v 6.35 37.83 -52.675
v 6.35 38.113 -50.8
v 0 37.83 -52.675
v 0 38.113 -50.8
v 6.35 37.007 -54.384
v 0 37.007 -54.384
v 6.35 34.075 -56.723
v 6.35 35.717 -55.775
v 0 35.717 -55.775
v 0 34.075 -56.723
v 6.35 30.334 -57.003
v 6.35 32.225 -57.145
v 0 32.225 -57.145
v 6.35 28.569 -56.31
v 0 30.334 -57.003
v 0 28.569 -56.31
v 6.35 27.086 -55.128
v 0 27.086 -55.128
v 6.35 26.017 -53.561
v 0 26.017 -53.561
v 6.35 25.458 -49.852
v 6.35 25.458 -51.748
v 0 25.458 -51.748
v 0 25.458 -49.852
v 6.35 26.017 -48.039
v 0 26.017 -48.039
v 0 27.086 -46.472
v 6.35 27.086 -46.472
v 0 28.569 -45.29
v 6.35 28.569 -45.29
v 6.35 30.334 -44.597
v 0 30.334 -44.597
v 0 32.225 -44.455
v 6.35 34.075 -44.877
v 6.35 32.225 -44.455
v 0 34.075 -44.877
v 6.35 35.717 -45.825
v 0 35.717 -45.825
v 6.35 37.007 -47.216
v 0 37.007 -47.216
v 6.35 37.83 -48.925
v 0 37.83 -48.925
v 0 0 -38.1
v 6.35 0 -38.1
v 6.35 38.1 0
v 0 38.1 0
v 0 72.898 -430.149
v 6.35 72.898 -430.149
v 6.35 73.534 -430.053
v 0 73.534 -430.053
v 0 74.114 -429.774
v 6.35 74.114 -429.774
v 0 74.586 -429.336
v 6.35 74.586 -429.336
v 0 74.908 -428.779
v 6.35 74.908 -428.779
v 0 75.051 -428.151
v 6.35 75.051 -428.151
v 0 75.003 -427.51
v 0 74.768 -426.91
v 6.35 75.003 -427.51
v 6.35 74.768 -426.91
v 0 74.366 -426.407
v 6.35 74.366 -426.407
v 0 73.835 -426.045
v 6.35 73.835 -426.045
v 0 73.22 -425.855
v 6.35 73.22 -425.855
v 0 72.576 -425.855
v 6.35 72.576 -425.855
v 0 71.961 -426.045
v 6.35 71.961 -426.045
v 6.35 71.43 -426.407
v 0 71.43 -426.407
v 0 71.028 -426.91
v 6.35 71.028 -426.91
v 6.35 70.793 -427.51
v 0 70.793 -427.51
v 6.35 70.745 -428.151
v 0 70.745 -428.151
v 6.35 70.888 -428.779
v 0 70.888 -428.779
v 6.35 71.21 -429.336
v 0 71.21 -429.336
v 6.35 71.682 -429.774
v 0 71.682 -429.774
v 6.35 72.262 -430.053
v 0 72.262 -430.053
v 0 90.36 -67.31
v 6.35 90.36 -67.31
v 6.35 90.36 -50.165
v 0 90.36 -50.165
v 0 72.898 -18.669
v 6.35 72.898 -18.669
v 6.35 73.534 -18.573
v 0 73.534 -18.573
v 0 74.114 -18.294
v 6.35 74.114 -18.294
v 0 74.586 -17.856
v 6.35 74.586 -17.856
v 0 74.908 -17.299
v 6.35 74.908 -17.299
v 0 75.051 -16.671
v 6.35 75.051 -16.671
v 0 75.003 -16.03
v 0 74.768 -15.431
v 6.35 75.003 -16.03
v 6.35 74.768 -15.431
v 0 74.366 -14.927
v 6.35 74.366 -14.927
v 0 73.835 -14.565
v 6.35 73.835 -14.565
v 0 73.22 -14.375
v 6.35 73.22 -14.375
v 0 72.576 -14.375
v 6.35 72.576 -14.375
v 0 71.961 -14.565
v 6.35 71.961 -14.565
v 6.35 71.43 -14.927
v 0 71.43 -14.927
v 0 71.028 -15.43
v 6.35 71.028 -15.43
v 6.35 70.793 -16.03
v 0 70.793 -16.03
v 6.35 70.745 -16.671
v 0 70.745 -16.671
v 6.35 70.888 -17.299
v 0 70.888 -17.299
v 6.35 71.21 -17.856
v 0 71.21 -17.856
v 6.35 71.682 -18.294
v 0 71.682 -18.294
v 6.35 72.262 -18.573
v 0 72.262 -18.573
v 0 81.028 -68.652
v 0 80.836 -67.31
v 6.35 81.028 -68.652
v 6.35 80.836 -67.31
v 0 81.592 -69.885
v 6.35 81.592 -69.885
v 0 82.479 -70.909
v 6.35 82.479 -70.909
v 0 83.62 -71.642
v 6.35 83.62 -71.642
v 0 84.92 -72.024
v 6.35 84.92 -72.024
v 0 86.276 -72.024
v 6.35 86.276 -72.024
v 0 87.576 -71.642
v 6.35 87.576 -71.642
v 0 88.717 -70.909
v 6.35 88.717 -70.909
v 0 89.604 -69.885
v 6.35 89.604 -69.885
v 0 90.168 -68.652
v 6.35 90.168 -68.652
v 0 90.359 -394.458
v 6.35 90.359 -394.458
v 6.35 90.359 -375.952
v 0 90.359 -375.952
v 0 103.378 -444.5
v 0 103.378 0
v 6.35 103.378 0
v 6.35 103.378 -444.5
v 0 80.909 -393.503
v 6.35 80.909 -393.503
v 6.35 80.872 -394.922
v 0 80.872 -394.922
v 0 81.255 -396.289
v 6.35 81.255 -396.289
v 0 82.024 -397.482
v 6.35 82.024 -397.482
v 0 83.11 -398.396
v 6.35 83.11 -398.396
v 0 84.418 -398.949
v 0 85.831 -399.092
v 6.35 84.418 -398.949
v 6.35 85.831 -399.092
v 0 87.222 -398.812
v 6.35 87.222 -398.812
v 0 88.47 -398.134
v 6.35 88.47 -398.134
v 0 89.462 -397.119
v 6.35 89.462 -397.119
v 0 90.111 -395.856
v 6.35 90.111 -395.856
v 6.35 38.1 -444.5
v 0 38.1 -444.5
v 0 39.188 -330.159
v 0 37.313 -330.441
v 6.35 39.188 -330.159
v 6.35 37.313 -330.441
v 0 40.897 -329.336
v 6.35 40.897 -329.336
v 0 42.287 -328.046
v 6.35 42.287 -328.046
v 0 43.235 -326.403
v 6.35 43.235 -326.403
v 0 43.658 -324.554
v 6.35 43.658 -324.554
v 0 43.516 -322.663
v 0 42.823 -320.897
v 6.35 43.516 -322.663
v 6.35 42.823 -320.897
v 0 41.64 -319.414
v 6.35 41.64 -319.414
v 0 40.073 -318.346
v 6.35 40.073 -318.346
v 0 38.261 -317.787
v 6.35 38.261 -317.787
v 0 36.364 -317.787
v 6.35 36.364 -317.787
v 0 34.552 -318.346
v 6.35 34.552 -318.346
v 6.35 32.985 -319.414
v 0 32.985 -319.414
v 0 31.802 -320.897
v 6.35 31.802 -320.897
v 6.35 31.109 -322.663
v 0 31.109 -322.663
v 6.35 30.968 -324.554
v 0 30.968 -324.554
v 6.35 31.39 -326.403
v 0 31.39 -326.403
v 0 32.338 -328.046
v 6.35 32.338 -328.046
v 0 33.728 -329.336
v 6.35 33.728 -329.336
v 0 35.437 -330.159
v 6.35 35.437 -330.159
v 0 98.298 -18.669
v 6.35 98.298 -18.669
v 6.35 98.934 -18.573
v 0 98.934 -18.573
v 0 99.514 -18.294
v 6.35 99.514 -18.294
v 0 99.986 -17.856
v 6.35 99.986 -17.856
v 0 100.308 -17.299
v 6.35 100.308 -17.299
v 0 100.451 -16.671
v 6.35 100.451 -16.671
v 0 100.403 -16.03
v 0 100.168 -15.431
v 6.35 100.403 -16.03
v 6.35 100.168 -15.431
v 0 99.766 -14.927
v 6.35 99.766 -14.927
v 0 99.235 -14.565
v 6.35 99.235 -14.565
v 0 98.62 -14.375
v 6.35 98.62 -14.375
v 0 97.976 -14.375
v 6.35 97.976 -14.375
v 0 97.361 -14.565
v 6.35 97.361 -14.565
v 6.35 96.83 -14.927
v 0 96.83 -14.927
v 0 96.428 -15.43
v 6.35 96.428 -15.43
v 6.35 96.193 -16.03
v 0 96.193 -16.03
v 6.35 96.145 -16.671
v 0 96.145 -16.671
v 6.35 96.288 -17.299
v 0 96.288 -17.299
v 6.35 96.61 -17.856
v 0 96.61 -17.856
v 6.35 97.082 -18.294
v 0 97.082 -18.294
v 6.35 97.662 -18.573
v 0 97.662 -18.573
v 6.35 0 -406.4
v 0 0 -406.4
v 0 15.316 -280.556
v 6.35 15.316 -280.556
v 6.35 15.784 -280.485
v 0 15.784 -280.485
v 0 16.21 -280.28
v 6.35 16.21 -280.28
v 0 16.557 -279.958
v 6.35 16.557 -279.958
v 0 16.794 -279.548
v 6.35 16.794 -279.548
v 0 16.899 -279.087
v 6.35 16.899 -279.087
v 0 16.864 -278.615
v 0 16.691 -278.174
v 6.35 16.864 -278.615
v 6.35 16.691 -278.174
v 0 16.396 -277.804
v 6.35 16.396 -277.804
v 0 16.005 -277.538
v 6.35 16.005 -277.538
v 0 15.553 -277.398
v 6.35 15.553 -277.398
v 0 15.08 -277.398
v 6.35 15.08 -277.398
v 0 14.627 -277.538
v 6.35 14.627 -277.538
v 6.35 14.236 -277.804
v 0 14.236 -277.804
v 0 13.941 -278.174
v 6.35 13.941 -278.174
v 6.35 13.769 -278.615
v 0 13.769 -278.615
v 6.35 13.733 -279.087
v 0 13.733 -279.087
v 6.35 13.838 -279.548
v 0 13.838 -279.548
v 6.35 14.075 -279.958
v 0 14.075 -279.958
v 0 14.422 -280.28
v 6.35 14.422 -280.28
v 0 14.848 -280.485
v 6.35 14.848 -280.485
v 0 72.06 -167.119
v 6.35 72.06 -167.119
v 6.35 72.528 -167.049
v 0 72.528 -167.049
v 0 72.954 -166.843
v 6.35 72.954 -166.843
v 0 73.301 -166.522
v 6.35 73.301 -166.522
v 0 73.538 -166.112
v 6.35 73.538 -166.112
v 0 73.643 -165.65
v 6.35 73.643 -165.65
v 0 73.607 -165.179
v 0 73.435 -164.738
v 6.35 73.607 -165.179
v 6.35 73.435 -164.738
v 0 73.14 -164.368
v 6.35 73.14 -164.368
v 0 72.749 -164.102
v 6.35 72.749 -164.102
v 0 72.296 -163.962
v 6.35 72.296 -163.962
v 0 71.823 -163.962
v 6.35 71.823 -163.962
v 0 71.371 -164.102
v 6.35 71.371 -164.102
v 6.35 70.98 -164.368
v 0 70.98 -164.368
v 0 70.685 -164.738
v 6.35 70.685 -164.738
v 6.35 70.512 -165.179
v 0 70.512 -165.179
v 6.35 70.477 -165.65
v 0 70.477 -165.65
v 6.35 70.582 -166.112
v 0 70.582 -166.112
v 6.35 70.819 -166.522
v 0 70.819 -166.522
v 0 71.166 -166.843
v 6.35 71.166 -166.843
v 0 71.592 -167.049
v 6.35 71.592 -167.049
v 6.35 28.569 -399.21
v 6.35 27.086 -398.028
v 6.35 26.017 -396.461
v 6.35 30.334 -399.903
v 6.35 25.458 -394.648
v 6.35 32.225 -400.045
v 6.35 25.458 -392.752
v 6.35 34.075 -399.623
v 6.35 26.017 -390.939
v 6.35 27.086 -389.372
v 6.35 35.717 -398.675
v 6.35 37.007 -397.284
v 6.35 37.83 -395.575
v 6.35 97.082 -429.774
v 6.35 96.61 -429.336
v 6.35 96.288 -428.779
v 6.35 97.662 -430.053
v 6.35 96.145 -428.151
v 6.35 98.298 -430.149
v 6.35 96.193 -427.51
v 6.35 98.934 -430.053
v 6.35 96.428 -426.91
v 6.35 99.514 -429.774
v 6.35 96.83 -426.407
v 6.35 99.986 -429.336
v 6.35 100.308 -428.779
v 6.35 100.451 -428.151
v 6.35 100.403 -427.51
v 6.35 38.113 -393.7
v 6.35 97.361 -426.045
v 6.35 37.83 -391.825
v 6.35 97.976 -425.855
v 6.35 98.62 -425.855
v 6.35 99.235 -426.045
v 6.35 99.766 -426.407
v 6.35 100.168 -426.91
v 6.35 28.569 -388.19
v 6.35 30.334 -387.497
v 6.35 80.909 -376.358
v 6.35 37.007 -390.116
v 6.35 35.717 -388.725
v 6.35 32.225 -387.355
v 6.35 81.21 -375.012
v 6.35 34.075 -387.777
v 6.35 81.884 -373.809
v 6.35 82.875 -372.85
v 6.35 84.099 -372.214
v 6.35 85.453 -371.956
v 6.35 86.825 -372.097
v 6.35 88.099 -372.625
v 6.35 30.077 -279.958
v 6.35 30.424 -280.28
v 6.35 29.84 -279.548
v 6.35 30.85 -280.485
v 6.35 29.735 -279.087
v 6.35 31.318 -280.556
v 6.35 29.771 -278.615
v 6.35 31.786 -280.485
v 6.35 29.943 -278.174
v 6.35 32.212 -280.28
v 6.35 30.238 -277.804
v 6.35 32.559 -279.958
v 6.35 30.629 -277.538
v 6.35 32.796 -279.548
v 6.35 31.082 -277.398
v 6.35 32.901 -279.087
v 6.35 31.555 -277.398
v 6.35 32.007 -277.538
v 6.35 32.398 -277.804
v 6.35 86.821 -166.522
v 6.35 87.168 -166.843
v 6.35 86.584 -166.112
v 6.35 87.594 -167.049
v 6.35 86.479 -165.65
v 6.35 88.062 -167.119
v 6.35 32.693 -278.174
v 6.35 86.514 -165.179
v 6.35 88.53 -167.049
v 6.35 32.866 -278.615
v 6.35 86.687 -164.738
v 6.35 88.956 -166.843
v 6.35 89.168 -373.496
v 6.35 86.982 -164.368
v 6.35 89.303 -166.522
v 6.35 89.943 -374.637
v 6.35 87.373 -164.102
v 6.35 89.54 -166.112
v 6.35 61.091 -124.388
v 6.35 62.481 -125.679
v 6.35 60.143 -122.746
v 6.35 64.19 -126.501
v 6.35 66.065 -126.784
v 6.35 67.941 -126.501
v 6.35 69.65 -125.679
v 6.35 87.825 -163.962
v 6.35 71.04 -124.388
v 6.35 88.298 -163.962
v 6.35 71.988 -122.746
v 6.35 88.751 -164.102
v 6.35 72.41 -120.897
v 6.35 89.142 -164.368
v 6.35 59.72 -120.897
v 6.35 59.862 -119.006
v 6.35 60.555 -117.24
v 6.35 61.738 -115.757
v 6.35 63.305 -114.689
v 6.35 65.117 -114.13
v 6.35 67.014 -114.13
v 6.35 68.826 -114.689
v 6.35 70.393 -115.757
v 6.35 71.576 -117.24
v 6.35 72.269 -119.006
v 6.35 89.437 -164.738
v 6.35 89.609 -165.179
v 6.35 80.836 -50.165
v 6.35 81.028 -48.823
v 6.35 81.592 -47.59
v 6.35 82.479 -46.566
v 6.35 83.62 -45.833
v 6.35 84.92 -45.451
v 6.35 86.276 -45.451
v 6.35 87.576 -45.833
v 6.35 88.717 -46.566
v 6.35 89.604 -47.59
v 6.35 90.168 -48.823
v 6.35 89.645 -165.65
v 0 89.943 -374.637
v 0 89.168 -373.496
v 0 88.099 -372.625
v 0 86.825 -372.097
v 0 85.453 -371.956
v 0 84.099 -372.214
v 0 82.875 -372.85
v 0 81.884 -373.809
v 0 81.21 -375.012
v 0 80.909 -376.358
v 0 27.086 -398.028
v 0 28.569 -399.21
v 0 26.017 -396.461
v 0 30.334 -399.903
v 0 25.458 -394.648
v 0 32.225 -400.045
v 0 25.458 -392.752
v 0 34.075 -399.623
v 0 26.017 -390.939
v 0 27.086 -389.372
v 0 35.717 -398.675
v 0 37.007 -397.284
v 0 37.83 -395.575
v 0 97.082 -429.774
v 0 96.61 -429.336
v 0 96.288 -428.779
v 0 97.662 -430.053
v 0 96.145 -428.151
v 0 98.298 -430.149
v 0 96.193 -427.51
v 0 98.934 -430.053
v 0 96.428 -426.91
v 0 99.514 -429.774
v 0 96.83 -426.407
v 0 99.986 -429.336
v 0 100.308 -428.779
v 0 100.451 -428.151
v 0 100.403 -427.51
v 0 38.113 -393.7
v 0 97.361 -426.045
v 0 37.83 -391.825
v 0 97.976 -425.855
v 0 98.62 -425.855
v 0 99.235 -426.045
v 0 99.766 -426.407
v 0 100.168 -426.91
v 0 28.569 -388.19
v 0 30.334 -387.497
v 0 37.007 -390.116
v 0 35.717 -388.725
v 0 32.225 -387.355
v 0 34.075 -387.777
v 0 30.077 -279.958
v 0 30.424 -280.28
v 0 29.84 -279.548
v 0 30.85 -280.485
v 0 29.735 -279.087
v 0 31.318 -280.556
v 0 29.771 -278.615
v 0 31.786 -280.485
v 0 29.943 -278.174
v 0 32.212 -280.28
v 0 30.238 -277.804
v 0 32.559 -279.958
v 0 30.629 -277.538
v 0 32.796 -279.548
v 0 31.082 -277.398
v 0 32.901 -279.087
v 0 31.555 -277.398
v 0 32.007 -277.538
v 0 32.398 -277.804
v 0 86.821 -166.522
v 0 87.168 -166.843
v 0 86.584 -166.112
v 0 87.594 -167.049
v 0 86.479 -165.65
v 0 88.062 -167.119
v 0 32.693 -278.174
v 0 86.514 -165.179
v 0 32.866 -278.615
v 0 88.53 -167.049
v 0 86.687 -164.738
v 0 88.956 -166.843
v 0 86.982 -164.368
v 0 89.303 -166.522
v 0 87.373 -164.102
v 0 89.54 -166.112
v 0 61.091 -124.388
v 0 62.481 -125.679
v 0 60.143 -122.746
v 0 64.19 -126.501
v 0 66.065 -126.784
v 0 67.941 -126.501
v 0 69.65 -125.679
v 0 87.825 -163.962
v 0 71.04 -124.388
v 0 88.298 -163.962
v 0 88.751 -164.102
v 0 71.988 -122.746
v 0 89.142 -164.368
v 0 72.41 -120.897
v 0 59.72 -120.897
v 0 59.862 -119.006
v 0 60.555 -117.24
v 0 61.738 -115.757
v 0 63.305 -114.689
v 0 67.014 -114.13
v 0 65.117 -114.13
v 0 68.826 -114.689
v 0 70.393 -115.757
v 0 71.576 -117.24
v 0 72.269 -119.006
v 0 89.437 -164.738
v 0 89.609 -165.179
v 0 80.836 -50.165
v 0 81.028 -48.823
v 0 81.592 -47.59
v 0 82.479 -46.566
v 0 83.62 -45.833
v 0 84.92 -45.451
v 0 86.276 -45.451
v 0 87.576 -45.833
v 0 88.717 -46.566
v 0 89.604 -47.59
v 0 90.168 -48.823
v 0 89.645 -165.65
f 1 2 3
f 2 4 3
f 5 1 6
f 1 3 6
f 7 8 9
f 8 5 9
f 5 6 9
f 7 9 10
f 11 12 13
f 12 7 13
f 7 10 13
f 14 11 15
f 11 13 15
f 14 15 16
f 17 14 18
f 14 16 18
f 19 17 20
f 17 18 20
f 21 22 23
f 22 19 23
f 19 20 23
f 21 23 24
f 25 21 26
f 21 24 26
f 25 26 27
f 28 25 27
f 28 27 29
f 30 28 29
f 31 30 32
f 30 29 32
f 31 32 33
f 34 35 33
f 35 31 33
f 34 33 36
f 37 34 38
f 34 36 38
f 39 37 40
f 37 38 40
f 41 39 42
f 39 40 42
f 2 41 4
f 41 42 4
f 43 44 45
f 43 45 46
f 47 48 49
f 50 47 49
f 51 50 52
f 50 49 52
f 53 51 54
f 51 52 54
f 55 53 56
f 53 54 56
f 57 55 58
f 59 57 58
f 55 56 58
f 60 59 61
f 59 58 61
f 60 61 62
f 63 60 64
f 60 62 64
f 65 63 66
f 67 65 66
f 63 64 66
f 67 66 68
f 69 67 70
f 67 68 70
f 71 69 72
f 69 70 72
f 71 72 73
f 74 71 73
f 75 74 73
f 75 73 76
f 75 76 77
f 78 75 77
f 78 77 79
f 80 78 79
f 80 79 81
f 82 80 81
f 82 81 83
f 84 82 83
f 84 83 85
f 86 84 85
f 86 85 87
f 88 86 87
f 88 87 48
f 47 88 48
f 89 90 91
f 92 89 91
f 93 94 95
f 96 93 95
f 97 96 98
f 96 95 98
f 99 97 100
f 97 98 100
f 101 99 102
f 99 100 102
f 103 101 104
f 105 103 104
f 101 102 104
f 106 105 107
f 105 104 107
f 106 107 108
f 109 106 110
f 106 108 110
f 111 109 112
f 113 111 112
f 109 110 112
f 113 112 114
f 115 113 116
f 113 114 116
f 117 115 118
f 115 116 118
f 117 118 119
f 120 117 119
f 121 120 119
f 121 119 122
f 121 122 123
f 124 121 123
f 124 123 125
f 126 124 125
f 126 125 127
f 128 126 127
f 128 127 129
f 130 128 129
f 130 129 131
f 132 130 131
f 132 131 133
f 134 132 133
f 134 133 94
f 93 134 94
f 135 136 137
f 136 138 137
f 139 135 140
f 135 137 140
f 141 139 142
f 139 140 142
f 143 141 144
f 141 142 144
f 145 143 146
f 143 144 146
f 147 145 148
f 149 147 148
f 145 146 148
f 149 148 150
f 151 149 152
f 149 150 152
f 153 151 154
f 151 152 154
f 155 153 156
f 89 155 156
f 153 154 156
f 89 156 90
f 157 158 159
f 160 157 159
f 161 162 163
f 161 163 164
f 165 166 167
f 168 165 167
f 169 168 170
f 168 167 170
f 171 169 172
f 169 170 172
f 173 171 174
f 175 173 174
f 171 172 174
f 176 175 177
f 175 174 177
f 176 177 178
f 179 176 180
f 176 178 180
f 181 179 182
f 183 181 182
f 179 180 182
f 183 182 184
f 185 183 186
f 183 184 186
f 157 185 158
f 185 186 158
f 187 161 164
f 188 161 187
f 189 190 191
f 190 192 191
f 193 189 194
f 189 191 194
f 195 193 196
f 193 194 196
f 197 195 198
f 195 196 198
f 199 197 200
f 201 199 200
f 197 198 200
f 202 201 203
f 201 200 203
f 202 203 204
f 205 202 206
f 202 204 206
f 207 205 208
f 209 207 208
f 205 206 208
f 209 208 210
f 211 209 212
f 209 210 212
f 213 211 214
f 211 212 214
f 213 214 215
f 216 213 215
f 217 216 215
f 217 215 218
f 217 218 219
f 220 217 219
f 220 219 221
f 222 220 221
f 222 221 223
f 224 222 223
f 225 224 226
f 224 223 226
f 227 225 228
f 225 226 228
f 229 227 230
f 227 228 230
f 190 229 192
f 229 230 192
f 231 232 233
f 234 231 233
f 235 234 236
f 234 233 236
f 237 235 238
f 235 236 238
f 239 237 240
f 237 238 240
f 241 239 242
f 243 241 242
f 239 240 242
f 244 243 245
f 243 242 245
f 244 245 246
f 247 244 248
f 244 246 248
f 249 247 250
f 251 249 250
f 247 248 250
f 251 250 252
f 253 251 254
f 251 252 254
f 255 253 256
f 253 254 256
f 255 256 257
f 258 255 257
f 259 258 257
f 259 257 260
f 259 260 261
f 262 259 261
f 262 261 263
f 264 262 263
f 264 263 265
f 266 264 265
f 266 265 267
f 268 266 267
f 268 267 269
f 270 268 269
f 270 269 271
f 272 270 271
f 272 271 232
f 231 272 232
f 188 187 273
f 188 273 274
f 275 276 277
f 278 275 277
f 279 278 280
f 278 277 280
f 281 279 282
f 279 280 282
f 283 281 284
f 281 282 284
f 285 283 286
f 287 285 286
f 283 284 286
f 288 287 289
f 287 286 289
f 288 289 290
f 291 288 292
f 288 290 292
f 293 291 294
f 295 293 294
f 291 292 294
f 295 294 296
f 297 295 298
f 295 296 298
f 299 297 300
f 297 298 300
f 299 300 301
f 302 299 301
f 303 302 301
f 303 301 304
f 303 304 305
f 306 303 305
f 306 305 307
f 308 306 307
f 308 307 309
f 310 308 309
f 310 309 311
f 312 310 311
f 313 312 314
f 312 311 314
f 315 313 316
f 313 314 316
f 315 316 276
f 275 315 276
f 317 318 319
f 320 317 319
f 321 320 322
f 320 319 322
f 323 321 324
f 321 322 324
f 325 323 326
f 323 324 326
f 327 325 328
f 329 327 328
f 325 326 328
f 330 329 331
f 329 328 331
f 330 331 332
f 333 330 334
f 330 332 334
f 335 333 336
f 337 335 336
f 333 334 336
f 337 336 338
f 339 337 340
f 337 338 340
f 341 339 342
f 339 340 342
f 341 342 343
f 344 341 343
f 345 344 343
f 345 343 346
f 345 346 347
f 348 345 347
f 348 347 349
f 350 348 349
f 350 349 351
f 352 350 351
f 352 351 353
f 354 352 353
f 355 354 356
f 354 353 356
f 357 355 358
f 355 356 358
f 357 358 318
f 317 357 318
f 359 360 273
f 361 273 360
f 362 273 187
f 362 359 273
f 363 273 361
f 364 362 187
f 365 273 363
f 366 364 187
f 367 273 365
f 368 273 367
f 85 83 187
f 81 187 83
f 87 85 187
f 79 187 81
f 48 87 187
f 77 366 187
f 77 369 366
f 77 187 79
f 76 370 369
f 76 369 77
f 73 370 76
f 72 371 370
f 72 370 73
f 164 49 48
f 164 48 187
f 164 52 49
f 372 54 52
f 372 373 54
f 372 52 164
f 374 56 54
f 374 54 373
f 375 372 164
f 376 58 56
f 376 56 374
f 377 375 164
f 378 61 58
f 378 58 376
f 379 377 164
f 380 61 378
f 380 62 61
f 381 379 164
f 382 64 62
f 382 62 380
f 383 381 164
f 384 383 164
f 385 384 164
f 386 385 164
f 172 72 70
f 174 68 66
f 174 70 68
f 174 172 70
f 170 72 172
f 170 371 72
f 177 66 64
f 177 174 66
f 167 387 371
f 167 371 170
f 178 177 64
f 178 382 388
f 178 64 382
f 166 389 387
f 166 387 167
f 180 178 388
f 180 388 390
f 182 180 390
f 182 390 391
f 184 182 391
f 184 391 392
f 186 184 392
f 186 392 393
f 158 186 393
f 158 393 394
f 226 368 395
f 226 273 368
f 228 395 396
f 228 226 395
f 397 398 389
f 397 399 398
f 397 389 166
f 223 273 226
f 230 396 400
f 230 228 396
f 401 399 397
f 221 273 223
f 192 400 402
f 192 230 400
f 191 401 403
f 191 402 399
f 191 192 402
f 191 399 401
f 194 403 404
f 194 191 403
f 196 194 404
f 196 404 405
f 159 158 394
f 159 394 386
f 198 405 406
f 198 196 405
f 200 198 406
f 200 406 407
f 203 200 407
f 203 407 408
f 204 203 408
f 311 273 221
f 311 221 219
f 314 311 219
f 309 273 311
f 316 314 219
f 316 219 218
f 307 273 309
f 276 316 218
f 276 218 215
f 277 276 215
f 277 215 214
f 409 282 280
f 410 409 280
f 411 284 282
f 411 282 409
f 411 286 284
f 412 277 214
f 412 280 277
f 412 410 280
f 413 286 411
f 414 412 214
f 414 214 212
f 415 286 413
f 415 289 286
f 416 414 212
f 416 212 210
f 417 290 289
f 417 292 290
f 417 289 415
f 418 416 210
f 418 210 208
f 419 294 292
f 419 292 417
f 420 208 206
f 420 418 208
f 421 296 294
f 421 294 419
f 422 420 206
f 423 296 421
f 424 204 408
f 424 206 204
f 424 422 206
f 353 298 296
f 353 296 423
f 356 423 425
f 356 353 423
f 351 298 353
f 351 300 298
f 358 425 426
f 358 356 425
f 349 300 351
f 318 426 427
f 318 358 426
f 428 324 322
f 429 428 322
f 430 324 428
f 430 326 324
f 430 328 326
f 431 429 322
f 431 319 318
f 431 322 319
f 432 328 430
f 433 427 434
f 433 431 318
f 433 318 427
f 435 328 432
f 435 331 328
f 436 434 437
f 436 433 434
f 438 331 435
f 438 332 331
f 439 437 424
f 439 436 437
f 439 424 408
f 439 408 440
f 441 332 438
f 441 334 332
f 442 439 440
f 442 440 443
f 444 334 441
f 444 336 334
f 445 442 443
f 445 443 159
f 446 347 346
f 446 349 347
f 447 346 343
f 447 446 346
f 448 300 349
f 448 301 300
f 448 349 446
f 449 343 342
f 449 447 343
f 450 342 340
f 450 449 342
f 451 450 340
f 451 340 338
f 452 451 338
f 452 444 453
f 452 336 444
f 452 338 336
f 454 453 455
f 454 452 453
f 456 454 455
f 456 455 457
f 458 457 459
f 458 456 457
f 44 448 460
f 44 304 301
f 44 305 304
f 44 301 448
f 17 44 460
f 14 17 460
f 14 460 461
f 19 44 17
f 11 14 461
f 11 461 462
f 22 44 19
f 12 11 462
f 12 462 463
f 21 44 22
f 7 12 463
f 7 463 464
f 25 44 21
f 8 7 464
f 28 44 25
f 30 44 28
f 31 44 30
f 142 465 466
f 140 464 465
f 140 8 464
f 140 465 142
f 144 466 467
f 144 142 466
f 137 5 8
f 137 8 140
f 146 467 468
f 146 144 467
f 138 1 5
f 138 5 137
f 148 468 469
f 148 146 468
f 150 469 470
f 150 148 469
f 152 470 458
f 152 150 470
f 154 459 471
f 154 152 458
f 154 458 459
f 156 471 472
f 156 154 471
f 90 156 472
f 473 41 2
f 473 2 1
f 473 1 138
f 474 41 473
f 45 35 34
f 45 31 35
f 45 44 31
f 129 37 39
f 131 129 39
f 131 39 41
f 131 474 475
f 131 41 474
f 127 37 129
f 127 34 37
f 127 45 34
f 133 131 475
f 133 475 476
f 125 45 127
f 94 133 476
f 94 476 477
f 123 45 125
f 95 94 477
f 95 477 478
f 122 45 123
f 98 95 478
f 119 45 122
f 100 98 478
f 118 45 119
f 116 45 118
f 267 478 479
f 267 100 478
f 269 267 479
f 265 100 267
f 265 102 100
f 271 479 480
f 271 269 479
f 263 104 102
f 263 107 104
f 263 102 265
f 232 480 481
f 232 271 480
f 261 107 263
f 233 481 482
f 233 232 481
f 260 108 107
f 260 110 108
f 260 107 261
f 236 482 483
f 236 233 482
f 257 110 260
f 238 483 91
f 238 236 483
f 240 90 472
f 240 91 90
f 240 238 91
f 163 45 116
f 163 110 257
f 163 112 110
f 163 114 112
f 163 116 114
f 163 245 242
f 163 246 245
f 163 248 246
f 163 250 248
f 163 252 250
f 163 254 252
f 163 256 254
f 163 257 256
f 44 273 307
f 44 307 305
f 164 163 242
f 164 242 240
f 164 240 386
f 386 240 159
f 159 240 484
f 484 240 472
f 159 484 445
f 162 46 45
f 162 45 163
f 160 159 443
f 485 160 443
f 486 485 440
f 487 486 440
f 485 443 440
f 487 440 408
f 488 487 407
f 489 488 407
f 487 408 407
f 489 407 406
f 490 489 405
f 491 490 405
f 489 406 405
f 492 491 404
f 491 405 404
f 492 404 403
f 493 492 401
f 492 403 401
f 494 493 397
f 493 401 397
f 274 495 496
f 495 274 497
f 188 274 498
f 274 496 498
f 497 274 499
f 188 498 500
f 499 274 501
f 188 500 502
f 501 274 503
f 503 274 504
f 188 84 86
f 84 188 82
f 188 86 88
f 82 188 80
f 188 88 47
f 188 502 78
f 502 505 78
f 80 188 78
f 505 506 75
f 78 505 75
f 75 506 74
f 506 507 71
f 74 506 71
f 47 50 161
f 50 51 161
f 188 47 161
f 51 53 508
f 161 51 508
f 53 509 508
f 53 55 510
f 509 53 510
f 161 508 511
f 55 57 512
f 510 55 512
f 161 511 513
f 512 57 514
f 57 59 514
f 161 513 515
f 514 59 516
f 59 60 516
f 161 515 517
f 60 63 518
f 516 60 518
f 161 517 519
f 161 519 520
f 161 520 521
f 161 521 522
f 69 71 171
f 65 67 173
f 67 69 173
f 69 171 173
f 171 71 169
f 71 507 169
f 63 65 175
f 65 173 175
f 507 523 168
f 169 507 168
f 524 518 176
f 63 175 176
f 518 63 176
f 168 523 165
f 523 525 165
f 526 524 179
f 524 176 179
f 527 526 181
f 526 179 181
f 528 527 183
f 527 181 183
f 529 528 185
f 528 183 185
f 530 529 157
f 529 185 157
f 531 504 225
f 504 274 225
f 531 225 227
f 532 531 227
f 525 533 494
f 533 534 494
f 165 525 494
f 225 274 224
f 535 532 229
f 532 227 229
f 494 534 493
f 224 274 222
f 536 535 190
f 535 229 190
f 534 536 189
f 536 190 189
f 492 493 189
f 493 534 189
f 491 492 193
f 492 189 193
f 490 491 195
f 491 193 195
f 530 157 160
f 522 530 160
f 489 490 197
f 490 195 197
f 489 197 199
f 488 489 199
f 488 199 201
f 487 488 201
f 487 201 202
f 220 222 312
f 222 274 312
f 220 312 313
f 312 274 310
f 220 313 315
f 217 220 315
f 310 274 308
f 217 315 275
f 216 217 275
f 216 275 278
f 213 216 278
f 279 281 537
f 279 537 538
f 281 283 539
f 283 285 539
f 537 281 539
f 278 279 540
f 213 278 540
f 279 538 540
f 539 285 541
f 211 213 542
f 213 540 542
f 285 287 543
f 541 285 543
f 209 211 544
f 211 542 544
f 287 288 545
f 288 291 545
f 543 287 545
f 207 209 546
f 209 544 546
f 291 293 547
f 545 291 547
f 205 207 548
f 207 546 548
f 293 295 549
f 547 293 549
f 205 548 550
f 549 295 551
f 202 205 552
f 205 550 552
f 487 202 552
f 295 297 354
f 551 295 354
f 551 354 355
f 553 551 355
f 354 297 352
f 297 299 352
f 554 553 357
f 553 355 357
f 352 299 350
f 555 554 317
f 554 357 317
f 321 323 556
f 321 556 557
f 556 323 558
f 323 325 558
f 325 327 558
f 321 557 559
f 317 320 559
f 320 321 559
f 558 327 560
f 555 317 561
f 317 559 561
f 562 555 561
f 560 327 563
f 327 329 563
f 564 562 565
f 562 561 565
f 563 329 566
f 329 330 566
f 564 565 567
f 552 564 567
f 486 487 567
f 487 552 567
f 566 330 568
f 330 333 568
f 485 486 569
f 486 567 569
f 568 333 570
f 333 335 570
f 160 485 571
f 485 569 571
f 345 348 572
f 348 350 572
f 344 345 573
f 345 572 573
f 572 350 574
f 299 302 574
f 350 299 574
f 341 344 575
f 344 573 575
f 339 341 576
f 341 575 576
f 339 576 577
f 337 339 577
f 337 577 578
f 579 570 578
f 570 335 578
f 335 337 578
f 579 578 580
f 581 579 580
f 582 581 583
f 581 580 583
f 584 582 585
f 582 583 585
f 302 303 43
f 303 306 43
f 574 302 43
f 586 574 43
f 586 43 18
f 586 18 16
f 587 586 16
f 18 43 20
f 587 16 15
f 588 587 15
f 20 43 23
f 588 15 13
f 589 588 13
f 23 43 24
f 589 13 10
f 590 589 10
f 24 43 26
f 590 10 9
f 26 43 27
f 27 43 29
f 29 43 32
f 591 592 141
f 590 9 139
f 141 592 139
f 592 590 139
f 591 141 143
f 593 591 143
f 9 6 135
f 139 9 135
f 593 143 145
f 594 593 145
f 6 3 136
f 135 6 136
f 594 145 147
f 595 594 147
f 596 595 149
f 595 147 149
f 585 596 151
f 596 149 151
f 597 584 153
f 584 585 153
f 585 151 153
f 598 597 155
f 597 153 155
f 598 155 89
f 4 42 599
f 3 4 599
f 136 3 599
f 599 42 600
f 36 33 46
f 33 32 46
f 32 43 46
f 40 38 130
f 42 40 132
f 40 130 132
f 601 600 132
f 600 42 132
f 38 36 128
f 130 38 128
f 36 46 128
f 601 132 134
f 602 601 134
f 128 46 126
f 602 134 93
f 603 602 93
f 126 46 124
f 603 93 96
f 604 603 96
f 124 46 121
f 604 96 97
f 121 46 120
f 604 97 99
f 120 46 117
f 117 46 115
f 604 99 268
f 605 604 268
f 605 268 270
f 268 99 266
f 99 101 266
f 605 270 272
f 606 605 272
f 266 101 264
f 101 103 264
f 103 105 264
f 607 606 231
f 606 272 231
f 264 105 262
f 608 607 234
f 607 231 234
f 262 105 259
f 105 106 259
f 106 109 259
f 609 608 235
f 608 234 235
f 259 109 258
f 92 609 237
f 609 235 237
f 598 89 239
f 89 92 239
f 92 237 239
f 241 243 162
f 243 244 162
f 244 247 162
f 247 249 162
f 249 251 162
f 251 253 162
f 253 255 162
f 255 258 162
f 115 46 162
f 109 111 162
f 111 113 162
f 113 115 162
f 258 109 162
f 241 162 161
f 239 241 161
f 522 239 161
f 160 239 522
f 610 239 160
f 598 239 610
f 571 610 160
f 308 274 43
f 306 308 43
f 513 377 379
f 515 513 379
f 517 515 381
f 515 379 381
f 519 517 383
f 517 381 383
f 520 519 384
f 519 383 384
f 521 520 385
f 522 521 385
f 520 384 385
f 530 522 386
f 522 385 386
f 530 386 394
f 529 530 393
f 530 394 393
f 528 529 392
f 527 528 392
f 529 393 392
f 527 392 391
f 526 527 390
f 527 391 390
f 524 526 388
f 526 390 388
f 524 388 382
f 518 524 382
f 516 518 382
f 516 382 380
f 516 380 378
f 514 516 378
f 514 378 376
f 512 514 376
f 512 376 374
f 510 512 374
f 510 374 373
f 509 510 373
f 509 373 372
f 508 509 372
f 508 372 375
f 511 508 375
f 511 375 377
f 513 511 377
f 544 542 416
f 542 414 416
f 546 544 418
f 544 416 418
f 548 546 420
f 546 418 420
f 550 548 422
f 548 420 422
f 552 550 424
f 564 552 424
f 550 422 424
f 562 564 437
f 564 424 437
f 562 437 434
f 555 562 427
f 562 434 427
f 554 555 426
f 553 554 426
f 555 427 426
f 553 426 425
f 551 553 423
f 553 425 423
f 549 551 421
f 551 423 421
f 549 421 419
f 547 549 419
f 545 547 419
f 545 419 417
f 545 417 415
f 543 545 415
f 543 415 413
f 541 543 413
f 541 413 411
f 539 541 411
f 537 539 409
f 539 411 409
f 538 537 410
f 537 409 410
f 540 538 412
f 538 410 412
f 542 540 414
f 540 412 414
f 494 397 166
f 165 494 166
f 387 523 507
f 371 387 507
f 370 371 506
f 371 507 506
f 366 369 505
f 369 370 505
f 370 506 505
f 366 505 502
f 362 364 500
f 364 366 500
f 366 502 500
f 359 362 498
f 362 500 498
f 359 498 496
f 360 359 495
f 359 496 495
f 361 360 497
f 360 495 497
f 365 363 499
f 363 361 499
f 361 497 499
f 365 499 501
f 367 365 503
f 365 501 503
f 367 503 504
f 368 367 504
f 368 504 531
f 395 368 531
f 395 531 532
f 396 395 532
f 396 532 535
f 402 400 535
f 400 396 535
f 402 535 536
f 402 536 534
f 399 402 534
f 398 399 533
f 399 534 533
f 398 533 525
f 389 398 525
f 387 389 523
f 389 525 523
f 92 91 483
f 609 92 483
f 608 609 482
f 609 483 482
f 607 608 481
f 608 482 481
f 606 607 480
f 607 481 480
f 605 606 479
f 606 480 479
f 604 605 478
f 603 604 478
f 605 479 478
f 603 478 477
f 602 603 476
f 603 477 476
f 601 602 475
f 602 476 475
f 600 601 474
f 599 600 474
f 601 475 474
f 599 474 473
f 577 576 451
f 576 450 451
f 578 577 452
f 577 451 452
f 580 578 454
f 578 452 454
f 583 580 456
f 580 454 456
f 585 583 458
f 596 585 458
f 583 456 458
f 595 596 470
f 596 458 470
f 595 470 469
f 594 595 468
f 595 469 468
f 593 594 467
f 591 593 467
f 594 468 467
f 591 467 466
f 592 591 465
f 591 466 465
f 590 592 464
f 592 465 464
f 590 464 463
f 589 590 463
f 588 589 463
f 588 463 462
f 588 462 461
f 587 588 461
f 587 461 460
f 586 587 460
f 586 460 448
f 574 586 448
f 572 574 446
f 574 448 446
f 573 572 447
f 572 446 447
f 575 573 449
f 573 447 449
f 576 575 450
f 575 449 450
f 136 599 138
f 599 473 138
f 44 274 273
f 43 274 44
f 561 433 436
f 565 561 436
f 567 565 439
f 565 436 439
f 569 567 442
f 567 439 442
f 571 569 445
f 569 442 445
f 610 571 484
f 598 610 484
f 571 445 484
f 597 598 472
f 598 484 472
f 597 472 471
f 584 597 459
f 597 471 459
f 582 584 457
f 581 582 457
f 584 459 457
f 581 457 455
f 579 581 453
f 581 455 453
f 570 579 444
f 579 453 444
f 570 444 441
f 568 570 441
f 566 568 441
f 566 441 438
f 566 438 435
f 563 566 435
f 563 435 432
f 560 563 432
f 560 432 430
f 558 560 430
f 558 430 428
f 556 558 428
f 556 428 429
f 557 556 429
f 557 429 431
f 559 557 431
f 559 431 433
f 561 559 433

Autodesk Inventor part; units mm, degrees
ref_plane "YZ Plane" through (0, 0, 0) normal (1, 0, 0) x (0, 1, 0)
ref_plane "XZ Plane" through (0, 0, 0) normal (0, 1, 0) x (-1, 0, 0)
ref_plane "XY Plane" through (0, 0, 0) normal (0, 0, 1) x (1, 0, 0)
sketch "Sketch1" plane through (0, 0, 0) normal (1, 0, 0) x (0, 1, 0)
  line L0 (0, 0) -> (103.378, 0)
  line L1 (103.378, 0) -> (103.378, -444.5)
  line L2 (103.378, -444.5) -> (0, -444.5)
  line L3 (0, -444.5) -> (0, 0)
  circle A0 centre (31.75, -50.8) radius 6.3627
  circle A1 centre (31.75, -393.7) radius 6.3627
  circle A2 centre (88.0618, -165.5318) radius 1.5875
  circle A3 centre (72.0598, -165.5318) radius 1.5875
  circle A4 centre (15.3162, -278.9682) radius 1.5875
  circle A5 centre (31.3182, -278.9682) radius 1.5875
  dimension "d0" = 103.378
  dimension "d1" = 444.5
  dimension "d2" = 12.7254
  dimension "d3" = 31.75
  dimension "d4" = 50.8
  dimension "d5" = 50.8
  dimension "d22" = 165.5318
  dimension "d23" = 3.175
  dimension "d24" = 15.3162
  dimension "d25" = 3.175
  dimension "d26" = 16.002
  dimension "d27" = 165.5318
  dimension "d28" = 3.175
  dimension "d29" = 15.3162
  dimension "d30" = 165.5318
  dimension "d31" = 3.175
  dimension "d32" = 16.002
  dimension "d33" = 165.5318
extrude "Extrusion1" add sketch "Sketch1" along normal blind 6.35 contours L0 L1 L2 L3 | A2 | A3 | A4 | A5
chamfer "Chamfer1" distance 38.1 angle 45 1 edges at (3.175, 0, 0)
chamfer "Chamfer2" distance 38.1 angle 45 1 edges at (3.175, 0, -444.5)
sketch "Sketch2" plane through (6.35, 0, 0) normal (1, 0, 0) x (0, 0, -1)
  line L0 (444.5, 38.1) -> (406.4, 0) projected
  line L1 (444.5, 38.1) -> (444.5, 103.378) projected
  line L2 (444.5, 103.378) -> (0, 103.378) projected
  line L3 (0, 103.378) -> (0, 38.1) projected
  line L4 (38.1, 0) -> (0, 38.1) projected
  line L5 (38.1, 0) -> (406.4, 0) projected
  circle A0 centre (393.7, 31.75) radius 6.3627 projected
  circle A1 centre (50.8, 31.75) radius 6.3627 projected
  circle A2 centre (120.4214, 66.0654) radius 6.3627
  circle A3 centre (324.0786, 37.3126) radius 6.3627
  point P0 (0, 0)
  dimension "d14" = 12.7254
  dimension "d15" = 120.4214
  dimension "d16" = 37.3126
  dimension "d17" = 12.7254
  dimension "d18" = 37.3126
  dimension "d19" = 120.4214
extrude "Extrusion2" cut sketch "Sketch2" against normal blind 25.4 contours A2 | A3
sketch "Sketch3" plane through (6.35, 0, 0) normal (1, 0, 0) x (0, 0, -1)
  circle A0 centre (120.4214, 66.0654) radius 6.3627 projected
  circle A1 centre (324.0786, 37.3126) radius 6.3627 projected
  line L0 (444.5, 38.1) -> (406.4, 0) projected
  line L1 (444.5, 38.1) -> (444.5, 103.378) projected
  line L2 (444.5, 103.378) -> (0, 103.378) projected
  line L3 (0, 103.378) -> (0, 38.1) projected
  line L4 (38.1, 0) -> (0, 38.1) projected
  line L5 (38.1, 0) -> (406.4, 0) projected
  circle A2 centre (393.7, 31.75) radius 6.3627 projected
  circle A3 centre (50.8, 31.75) radius 6.3627 projected
  circle A4 centre (165.5318, 88.0618) radius 1.5875
  circle A5 centre (165.5318, 72.0598) radius 1.5875
  circle A6 centre (278.9682, 15.3162) radius 1.5875
  circle A7 centre (278.9682, 31.3182) radius 1.5875
  point P0 (0, 0)
  dimension "d34" = 3.175
  dimension "d35" = 165.5318
  dimension "d36" = 15.3162
  dimension "d37" = 3.175
  dimension "d38" = 16.002
  dimension "d39" = 3.175
  dimension "d40" = 3.175
  dimension "d41" = 15.3162
  dimension "d42" = 16.002
  dimension "d43" = 165.5318
extrude "Extrusion3" cut sketch "Sketch3" against normal blind 25.4 contours A4 | A5 | A6 | A7
sketch "Sketch4" plane through (6.35, 0, 0) normal (1, 0, 0) x (0, 0, -1)
  circle A0 centre (278.9682, 15.3162) radius 1.5875 projected
  circle A1 centre (165.5318, 88.0618) radius 1.5875 projected
  circle A2 centre (165.5318, 72.0598) radius 1.5875 projected
  circle A3 centre (278.9682, 31.3182) radius 1.5875 projected
  circle A4 centre (120.4214, 66.0654) radius 6.3627 projected
  circle A5 centre (324.0786, 37.3126) radius 6.3627 projected
  line L0 (444.5, 38.1) -> (406.4, 0) projected
  line L1 (444.5, 38.1) -> (444.5, 103.378) projected
  line L2 (444.5, 103.378) -> (0, 103.378) projected
  line L3 (0, 103.378) -> (0, 38.1) projected
  line L4 (38.1, 0) -> (0, 38.1) projected
  line L5 (38.1, 0) -> (406.4, 0) projected
  circle A6 centre (393.7, 31.75) radius 6.3627 projected
  circle A7 centre (50.8, 31.75) radius 6.3627 projected
  arc A8 (50.165, 90.3605) -> (50.165, 80.8355) centre (50.165, 85.598) ccw
  arc A9 (67.31, 80.8355) -> (67.31, 90.3605) centre (67.31, 85.598) ccw
  line L6 (50.165, 80.8355) -> (67.31, 80.8355)
  line L7 (67.31, 90.3605) -> (50.165, 90.3605)
  arc A10 (393.5026, 80.9088) -> (394.4579, 90.3589) centre (394.335, 85.598) ccw
  arc A11 (375.9516, 90.3589) -> (376.3576, 80.9088) centre (376.7145, 85.6579) ccw
  line L8 (376.3576, 80.9088) -> (393.5026, 80.9088)
  line L9 (394.4579, 90.3589) -> (375.9516, 90.3589)
  point P0 (0, 0)
  dimension "d46" = 9.525
  dimension "d47" = 50.165
  dimension "d48" = 17.78
  dimension "d49" = 9.525
  dimension "d50" = 17.145
  dimension "d51" = 9.525
  dimension "d52" = 50.165
  dimension "d53" = 17.78
  dimension "d54" = 9.525
  dimension "d56" = 17.145
extrude "Extrusion4" cut sketch "Sketch4" against normal blind 25.4 contours L7 A9 L6 A8 | L8 A11 L9 A10
sketch "Sketch5" plane through (6.35, 0, 0) normal (1, 0, 0) x (0, 0, -1)
  line L0 (67.31, 80.8355) -> (50.165, 80.8355) projected
  arc A0 (50.165, 90.3605) -> (50.165, 80.8355) centre (50.165, 85.598) ccw projected
  line L1 (50.165, 90.3605) -> (67.31, 90.3605) projected
  arc A1 (67.31, 80.8355) -> (67.31, 90.3605) centre (67.31, 85.598) ccw projected
  line L2 (393.5026, 80.9088) -> (376.3576, 80.9088) projected
  arc A2 (375.9516, 90.3589) -> (376.3576, 80.9088) centre (376.7145, 85.6579) ccw projected
  line L3 (375.9516, 90.3589) -> (394.4579, 90.3589) projected
  arc A3 (393.5026, 80.9088) -> (394.4579, 90.3589) centre (394.335, 85.598) ccw projected
  circle A4 centre (278.9682, 15.3162) radius 1.5875 projected
  circle A5 centre (165.5318, 88.0618) radius 1.5875 projected
  circle A6 centre (165.5318, 72.0598) radius 1.5875 projected
  circle A7 centre (278.9682, 31.3182) radius 1.5875 projected
  circle A8 centre (120.4214, 66.0654) radius 6.3627 projected
  circle A9 centre (324.0786, 37.3126) radius 6.3627 projected
  line L4 (444.5, 38.1) -> (406.4, 0) projected
  line L5 (444.5, 38.1) -> (444.5, 103.378) projected
  line L6 (444.5, 103.378) -> (0, 103.378) projected
  line L7 (0, 103.378) -> (0, 38.1) projected
  line L8 (38.1, 0) -> (0, 38.1) projected
  line L9 (38.1, 0) -> (406.4, 0) projected
  circle A10 centre (393.7, 31.75) radius 6.3627 projected
  circle A11 centre (50.8, 31.75) radius 6.3627 projected
  circle A12 centre (16.51, 98.298) radius 2.159
  circle A13 centre (16.51, 72.898) radius 2.159
  circle A14 centre (427.99, 98.298) radius 2.159
  circle A15 centre (427.99, 72.898) radius 2.159
  point P0 (0, 0)
  dimension "d59" = 4.318
  dimension "d60" = 16.51
  dimension "d61" = 5.08
  dimension "d62" = 4.318
  dimension "d63" = 25.4
  dimension "d64" = 4.318
  dimension "d65" = 4.318
  dimension "d66" = 5.08
  dimension "d67" = 25.4
  dimension "d68" = 16.51
extrude "Extrusion5" cut sketch "Sketch5" against normal blind 25.4 contours A12 | A13 | A14 | A15
properties part number "DriveTrain3.0"
